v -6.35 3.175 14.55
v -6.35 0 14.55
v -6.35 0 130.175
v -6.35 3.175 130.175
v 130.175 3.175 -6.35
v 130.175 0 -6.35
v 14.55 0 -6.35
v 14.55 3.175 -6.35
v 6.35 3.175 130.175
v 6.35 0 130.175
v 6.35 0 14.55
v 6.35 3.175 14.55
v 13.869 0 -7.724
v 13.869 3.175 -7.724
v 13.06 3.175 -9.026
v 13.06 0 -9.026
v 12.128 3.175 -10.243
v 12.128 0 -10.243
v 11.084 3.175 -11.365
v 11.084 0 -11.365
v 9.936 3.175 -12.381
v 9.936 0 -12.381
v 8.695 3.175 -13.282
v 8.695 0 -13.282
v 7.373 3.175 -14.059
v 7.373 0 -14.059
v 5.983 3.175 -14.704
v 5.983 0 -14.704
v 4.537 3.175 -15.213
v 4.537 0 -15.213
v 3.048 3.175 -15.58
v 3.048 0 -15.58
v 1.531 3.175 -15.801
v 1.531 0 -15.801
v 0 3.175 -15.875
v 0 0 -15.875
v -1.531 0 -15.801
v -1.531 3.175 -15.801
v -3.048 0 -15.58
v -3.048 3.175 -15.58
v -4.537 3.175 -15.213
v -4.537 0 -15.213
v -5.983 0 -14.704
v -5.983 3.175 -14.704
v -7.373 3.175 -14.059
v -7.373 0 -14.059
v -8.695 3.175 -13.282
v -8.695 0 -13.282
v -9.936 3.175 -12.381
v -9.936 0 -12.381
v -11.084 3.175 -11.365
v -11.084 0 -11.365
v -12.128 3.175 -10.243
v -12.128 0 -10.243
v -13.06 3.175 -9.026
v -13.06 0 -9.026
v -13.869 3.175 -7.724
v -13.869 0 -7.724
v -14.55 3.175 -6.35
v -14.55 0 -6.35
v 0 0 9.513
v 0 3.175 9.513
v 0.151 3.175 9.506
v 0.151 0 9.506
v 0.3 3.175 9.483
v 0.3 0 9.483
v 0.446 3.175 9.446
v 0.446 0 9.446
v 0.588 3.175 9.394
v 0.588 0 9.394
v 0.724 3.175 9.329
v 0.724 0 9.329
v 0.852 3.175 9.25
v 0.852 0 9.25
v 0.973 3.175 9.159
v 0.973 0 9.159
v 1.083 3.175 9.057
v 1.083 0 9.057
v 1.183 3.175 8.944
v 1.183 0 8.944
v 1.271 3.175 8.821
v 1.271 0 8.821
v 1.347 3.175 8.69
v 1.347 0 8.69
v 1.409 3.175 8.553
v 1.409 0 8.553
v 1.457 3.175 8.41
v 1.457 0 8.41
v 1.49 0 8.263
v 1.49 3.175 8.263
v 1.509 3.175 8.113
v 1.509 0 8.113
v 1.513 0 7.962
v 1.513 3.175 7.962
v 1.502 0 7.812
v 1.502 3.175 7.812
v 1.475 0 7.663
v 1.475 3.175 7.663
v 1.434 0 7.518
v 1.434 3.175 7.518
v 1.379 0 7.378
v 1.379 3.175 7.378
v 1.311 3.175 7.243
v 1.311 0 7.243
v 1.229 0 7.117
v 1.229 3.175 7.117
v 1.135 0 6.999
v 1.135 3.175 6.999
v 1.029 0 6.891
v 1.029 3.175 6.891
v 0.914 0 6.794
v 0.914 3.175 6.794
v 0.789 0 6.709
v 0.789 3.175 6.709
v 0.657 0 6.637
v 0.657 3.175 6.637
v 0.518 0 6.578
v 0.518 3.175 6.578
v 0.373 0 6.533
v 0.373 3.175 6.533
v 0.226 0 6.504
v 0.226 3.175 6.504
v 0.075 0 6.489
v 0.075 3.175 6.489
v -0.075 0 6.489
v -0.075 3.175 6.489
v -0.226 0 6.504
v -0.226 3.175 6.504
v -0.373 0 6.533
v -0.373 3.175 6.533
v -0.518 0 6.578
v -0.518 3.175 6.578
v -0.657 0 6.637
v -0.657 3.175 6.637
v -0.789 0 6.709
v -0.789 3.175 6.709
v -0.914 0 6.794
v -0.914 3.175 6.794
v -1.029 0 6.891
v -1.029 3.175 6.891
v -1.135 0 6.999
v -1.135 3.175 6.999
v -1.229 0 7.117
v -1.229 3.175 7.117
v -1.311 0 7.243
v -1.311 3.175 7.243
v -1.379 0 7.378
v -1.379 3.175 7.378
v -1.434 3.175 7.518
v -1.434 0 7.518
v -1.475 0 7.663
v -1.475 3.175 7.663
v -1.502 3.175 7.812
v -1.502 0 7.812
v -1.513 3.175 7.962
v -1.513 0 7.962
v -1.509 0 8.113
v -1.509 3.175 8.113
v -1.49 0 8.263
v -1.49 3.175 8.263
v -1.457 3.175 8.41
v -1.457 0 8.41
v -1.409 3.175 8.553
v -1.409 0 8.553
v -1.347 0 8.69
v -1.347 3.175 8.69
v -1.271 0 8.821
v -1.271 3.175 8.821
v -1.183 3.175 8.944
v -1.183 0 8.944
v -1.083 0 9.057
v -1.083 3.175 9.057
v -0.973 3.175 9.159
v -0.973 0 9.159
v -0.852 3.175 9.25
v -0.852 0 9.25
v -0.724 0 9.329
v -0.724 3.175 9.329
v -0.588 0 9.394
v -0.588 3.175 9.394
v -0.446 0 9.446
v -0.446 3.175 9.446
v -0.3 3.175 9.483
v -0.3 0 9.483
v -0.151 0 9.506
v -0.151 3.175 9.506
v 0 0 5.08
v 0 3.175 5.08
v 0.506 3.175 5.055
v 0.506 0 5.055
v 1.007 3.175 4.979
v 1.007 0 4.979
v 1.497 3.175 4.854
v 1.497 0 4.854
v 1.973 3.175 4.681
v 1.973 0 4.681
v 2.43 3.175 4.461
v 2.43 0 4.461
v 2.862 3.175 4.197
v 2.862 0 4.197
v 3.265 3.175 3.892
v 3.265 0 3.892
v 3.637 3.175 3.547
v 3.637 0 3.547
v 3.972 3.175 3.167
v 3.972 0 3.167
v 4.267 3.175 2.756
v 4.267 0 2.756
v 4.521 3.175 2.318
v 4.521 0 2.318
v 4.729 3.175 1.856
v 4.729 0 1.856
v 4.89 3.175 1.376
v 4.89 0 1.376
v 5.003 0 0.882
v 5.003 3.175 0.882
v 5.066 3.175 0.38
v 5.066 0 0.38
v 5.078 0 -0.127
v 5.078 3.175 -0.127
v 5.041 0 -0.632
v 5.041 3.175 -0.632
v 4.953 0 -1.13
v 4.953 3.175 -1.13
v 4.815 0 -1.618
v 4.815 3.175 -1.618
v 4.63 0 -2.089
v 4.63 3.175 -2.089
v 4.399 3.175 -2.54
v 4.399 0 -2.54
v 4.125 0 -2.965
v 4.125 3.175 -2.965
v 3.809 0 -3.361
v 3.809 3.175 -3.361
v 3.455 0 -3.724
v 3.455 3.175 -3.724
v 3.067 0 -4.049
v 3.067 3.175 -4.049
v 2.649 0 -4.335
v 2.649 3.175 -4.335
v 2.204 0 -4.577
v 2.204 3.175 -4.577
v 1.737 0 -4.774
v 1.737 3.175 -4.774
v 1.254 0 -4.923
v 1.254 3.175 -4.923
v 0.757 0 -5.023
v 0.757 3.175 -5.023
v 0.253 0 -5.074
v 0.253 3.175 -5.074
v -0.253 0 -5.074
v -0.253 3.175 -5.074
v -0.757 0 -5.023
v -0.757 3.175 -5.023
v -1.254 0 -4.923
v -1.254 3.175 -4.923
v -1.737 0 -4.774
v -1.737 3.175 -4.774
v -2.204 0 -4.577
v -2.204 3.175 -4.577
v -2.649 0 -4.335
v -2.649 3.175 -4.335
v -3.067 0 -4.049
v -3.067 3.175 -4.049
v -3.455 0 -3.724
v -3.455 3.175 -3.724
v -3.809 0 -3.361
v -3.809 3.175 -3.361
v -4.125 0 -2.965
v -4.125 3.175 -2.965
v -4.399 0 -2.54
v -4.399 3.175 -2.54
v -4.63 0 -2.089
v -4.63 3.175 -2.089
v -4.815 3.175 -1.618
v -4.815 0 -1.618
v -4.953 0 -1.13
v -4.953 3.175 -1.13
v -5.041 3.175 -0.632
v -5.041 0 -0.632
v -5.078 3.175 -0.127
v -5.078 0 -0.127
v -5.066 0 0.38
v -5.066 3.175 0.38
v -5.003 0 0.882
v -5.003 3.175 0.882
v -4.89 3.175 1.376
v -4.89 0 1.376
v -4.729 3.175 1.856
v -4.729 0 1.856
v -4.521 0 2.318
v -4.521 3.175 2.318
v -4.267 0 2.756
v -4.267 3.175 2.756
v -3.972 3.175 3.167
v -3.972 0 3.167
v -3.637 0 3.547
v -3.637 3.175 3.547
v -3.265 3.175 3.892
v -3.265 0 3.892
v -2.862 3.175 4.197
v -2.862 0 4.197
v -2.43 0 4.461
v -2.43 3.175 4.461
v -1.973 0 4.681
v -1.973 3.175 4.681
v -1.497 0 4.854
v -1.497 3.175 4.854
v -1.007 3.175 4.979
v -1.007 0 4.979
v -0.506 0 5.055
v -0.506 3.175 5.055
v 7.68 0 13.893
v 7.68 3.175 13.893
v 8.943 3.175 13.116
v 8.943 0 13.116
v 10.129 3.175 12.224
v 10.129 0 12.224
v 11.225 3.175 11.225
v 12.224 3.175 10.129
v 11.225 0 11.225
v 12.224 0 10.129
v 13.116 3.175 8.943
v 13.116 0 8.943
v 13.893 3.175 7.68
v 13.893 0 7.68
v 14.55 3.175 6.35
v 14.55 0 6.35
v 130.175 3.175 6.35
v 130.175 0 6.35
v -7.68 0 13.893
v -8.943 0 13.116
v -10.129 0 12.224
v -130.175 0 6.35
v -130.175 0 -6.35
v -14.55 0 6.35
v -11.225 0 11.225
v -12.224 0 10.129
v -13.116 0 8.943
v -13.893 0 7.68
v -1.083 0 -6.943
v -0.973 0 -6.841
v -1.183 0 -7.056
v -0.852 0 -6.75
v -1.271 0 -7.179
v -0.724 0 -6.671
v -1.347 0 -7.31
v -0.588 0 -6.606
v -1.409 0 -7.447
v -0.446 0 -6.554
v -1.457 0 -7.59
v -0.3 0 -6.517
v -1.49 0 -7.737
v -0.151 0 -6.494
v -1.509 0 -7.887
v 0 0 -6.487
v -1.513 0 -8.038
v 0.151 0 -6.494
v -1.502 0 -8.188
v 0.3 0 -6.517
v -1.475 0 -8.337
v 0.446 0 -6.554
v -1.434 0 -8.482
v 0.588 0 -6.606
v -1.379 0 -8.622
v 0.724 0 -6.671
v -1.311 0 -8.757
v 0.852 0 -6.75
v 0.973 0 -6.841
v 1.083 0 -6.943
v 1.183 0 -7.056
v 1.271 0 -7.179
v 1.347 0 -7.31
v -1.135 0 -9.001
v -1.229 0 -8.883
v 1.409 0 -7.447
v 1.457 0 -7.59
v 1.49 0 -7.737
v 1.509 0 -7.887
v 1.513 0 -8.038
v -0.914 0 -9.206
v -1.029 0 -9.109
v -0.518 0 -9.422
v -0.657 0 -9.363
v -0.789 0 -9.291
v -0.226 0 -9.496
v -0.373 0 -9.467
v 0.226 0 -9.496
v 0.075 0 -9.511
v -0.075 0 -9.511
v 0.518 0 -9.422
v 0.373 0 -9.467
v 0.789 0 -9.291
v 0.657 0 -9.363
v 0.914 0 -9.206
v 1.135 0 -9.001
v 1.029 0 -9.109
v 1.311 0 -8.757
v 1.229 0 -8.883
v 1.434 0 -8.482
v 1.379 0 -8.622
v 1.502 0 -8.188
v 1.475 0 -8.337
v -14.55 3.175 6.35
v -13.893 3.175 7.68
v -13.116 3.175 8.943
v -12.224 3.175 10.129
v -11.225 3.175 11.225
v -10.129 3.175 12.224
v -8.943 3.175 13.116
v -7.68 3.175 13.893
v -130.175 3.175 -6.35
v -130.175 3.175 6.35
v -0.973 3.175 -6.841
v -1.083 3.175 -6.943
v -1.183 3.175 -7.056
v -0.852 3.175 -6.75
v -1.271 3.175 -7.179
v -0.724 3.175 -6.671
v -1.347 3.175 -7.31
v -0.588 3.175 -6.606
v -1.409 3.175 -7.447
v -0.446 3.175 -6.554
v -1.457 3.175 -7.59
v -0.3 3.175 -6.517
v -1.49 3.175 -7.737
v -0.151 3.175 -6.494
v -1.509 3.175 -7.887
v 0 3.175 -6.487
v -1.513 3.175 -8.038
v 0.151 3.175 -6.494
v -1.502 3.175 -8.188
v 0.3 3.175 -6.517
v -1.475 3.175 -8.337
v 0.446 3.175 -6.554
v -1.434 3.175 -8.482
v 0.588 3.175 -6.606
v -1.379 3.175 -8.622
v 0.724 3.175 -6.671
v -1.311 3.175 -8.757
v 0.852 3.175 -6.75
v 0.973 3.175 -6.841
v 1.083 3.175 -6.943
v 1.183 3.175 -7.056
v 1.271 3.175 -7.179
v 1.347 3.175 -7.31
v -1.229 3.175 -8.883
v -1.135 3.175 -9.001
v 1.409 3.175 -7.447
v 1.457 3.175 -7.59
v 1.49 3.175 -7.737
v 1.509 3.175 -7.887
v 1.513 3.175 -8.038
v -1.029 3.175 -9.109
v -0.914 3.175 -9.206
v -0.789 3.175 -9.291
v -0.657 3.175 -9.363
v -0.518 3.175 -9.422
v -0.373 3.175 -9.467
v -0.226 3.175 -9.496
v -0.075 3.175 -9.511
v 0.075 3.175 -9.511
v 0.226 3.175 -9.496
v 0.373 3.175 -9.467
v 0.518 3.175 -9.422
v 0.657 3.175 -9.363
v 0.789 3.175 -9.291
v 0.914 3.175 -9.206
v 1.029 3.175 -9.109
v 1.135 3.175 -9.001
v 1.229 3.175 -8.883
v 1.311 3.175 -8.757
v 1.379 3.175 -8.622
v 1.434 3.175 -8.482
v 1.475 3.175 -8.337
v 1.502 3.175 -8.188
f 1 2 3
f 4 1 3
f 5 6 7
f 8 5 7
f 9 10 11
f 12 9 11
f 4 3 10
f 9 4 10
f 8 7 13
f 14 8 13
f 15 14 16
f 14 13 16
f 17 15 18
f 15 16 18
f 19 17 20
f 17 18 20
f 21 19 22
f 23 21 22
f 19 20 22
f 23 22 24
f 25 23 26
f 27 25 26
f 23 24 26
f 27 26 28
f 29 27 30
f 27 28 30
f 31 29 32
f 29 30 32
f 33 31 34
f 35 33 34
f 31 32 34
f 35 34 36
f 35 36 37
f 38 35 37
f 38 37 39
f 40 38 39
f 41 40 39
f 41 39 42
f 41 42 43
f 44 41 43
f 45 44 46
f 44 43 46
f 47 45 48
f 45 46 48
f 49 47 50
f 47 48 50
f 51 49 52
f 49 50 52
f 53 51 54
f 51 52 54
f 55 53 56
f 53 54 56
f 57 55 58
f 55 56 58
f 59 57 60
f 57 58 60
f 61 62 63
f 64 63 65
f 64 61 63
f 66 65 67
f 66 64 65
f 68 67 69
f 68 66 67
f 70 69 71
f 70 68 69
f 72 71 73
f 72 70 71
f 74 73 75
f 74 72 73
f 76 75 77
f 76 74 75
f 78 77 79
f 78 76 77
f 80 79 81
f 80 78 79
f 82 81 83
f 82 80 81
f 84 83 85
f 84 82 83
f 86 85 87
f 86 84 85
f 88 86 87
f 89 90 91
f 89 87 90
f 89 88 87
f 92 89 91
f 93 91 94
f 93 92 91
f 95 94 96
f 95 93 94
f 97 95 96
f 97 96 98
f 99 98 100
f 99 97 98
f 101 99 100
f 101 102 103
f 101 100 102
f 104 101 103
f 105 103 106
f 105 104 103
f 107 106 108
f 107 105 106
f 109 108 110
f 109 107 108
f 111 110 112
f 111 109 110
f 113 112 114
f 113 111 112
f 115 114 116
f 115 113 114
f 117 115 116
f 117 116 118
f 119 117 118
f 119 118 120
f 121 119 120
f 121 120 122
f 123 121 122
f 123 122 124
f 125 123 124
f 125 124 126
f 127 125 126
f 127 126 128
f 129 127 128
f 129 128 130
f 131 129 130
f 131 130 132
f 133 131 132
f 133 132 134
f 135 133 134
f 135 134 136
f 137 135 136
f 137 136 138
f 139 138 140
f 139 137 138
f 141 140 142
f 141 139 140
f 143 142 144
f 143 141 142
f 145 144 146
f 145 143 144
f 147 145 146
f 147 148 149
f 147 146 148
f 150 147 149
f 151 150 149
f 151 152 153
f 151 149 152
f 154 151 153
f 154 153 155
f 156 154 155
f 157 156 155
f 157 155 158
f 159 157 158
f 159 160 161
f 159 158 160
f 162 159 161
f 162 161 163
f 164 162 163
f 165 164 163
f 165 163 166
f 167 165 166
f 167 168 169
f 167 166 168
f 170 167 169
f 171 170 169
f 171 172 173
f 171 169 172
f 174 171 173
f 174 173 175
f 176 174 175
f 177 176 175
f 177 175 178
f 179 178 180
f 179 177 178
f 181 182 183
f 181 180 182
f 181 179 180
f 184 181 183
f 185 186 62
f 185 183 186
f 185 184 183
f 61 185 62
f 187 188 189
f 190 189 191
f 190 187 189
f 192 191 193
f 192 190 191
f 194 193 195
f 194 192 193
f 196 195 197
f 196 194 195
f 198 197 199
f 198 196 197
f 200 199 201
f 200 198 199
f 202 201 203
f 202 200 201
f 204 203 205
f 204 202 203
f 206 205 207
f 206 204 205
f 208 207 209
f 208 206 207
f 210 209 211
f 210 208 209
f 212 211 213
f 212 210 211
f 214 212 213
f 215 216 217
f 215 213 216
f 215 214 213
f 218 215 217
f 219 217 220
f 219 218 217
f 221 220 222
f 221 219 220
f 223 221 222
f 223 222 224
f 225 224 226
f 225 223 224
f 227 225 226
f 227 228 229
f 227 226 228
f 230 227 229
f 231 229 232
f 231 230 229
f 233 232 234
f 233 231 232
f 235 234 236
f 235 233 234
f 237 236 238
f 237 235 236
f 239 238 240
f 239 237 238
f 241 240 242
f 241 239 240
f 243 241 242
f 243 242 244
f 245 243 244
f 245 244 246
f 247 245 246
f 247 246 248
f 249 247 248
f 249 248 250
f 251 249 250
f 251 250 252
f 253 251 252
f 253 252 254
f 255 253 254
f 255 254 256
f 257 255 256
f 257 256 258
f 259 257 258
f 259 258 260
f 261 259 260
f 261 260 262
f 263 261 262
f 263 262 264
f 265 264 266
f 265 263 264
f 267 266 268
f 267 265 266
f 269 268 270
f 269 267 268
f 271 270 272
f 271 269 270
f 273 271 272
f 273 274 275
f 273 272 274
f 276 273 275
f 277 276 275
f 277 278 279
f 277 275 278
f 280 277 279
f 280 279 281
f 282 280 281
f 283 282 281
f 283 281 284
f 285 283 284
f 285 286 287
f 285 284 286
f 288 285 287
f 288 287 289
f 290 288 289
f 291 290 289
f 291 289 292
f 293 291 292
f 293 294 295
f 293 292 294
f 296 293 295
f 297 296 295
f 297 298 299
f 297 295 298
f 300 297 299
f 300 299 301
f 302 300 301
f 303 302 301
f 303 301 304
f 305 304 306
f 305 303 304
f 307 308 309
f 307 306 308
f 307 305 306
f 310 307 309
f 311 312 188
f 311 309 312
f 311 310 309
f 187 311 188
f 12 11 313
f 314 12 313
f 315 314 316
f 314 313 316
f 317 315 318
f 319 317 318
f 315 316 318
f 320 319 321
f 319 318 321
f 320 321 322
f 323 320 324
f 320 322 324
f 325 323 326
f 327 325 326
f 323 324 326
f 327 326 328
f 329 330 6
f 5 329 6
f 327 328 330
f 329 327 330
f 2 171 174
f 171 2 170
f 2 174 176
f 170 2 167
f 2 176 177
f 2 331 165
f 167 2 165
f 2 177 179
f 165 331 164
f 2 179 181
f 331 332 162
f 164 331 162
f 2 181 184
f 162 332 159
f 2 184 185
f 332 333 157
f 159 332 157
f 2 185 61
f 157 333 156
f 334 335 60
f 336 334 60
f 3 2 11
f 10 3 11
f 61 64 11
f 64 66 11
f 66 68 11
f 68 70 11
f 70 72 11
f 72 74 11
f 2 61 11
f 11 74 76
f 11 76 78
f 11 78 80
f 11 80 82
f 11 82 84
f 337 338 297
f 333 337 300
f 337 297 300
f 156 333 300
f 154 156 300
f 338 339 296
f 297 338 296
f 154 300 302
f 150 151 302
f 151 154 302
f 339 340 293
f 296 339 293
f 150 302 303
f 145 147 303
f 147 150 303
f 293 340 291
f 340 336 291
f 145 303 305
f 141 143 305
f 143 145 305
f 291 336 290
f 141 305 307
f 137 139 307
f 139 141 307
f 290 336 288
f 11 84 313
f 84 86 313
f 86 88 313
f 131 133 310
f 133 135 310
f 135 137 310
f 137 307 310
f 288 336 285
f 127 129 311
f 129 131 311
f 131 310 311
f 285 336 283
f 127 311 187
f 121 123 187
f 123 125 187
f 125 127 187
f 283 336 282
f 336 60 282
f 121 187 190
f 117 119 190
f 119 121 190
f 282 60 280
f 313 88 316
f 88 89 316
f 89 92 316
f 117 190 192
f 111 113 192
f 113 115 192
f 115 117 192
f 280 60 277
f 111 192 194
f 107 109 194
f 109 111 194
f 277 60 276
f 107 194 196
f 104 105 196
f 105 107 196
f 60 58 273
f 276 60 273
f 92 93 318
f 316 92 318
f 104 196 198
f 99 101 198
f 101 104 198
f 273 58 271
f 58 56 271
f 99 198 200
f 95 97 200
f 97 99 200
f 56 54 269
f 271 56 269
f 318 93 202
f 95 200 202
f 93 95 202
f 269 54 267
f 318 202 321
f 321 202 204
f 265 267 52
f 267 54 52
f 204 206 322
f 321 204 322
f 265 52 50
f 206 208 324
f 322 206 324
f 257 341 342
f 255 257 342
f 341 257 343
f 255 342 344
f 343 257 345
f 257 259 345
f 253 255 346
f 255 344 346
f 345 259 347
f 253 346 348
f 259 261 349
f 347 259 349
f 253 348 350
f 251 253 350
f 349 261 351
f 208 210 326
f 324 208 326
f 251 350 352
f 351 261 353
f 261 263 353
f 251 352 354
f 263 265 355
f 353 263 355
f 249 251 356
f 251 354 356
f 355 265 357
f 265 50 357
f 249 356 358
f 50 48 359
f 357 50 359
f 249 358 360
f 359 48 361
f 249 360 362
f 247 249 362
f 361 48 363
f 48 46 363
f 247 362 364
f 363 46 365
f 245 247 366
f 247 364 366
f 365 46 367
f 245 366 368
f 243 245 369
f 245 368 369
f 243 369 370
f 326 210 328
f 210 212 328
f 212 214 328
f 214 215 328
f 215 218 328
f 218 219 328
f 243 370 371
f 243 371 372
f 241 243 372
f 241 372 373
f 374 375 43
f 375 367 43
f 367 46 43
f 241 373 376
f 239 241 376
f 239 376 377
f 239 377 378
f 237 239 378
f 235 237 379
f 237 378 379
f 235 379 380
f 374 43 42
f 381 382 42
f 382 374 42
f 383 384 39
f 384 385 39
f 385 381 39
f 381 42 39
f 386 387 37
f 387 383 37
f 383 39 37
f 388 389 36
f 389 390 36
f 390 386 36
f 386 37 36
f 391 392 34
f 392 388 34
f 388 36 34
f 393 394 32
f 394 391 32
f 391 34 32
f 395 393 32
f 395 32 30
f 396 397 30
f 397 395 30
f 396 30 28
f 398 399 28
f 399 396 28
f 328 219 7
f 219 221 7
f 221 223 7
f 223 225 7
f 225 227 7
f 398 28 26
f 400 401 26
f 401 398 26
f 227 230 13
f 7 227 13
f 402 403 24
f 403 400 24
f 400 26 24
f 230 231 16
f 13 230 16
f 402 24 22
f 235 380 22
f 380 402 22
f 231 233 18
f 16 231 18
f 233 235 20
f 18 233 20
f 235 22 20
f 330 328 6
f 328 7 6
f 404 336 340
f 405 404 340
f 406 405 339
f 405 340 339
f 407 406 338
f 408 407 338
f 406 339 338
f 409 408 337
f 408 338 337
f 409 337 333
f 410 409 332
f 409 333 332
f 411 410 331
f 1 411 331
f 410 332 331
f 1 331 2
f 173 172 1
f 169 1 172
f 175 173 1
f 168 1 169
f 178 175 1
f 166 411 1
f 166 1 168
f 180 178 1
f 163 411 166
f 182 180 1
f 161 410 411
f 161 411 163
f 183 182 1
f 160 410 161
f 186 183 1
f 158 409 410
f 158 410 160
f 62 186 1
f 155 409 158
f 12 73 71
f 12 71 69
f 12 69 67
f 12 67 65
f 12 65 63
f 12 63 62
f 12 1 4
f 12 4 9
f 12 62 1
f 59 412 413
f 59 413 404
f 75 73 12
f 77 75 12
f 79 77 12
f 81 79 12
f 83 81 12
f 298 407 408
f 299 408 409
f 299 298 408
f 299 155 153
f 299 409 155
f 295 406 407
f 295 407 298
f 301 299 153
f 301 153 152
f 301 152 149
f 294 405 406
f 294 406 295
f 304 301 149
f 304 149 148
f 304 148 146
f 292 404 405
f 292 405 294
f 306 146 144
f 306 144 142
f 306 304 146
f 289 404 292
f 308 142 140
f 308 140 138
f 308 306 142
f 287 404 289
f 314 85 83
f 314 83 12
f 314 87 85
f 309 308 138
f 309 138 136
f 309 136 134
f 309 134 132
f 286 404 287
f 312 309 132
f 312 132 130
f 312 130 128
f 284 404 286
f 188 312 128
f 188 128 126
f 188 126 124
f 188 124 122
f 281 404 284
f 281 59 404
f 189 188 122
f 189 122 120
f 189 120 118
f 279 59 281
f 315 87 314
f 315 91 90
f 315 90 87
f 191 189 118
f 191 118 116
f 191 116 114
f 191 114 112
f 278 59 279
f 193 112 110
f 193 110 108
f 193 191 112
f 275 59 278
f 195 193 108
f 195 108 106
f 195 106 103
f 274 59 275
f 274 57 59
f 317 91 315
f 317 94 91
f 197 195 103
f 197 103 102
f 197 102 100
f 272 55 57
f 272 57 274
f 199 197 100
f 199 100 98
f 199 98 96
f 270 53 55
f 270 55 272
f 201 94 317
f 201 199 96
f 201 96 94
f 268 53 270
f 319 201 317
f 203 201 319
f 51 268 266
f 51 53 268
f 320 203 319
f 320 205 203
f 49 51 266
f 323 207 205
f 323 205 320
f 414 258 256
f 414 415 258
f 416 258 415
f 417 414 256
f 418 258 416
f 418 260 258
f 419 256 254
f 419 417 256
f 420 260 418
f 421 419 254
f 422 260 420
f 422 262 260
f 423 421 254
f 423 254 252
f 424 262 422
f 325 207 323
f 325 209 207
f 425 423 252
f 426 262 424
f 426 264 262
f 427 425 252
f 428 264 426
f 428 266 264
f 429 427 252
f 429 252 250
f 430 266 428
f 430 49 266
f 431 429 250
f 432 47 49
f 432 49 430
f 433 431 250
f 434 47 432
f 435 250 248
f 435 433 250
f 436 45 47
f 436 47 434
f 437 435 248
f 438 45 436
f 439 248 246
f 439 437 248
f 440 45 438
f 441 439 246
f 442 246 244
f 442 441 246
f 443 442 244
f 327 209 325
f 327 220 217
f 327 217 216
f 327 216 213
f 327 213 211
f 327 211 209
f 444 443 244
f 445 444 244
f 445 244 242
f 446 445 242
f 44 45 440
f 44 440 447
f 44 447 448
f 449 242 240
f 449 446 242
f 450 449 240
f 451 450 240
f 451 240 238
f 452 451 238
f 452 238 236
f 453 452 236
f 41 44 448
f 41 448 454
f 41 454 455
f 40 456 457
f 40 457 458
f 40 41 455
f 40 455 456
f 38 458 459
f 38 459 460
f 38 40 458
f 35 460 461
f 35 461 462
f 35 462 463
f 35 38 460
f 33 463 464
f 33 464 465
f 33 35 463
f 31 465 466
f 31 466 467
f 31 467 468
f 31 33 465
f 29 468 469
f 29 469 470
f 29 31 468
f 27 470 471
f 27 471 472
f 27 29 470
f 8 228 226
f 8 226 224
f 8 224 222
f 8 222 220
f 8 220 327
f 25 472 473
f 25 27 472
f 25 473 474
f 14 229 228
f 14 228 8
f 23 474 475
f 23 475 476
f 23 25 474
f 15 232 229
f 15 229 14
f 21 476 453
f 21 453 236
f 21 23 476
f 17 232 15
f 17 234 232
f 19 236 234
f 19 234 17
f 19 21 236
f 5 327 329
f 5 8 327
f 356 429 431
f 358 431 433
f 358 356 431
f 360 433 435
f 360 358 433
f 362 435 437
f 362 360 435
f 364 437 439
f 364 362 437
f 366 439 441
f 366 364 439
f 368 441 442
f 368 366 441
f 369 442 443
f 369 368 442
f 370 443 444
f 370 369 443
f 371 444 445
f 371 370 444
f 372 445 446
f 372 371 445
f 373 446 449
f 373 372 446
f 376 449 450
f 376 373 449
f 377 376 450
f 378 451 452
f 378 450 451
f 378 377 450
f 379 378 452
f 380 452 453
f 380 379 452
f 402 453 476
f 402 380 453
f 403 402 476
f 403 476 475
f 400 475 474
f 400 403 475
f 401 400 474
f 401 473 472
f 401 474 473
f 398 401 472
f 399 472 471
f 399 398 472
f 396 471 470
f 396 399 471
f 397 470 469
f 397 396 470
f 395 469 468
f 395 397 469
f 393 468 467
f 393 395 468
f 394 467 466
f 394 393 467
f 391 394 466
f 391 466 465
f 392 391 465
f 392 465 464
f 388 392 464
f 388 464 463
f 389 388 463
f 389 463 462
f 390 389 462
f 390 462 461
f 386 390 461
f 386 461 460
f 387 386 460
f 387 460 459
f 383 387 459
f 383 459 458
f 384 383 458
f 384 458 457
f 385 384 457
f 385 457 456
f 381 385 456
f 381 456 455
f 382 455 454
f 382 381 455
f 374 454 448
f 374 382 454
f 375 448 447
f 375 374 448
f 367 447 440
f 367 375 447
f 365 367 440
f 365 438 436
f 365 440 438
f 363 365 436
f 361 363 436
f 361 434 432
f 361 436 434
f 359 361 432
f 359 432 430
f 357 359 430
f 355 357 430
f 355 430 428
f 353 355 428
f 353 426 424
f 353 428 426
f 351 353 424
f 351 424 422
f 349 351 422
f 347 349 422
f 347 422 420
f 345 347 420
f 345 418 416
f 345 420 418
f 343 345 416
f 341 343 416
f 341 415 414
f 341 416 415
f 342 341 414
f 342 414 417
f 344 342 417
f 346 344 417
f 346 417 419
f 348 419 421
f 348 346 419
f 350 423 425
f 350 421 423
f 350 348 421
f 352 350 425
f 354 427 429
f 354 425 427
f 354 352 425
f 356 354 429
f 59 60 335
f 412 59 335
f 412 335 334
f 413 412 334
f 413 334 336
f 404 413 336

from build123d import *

# Parameters (mm, degrees)
BOSS_EXTRUDE1_DEPTH = 3.175
SCREW_HOLES_R       = 1.513296856
SCREW_HOLES_R_2     = 5.08
CUT_EXTRUDE1_DEPTH  = 185.122627276


with BuildPart() as part:
    # Sketch1 → Boss-Extrude1 (new body)
    with BuildSketch(Plane(origin=(0, 0, 0), x_dir=(1, 0, 0), z_dir=(0, 1, 0))):
        with BuildLine():
            Line((-14.549677831, 6.35), (-130.175, 6.35))
            Line((-130.175, 6.35), (-130.175, -6.35))
            Line((-130.175, -6.35), (-14.549677831, -6.35))
            ThreePointArc((-14.549677831, -6.35), (-11.225320151, -11.225320151), (-6.35, -14.549677831))
            Line((-6.35, -14.549677831), (-6.35, -130.175))
            Line((-6.35, -130.175), (6.35, -130.175))
            Line((6.35, -130.175), (6.35, -14.549677831))
            ThreePointArc((6.35, -14.549677831), (11.225320151, -11.225320151), (14.549677831, -6.35))
            Line((14.549677831, -6.35), (130.175, -6.35))
            Line((130.175, -6.35), (130.175, 6.35))
            Line((130.175, 6.35), (14.549677831, 6.35))
            ThreePointArc((14.549677831, 6.35), (0, 15.875), (-14.549677831, 6.35))
        make_face()
    extrude(amount=BOSS_EXTRUDE1_DEPTH)

    # Screw holes → Cut-Extrude1 (cut, through all)
    with BuildSketch(Plane(origin=(0, 0, 0), x_dir=(1, 0, 0), z_dir=(0, 1, 0))):
        with Locations(Location((0, 8, 0), (0, 0, 270))):
            Circle(SCREW_HOLES_R)
        with Locations(Location((0, -8, 0), (0, 0, 270))):
            Circle(SCREW_HOLES_R)
        with Locations(Location((0, 0, 0), (0, 0, 270))):
            Circle(SCREW_HOLES_R_2)
    extrude(amount=CUT_EXTRUDE1_DEPTH, mode=Mode.SUBTRACT)


solid = part.part
